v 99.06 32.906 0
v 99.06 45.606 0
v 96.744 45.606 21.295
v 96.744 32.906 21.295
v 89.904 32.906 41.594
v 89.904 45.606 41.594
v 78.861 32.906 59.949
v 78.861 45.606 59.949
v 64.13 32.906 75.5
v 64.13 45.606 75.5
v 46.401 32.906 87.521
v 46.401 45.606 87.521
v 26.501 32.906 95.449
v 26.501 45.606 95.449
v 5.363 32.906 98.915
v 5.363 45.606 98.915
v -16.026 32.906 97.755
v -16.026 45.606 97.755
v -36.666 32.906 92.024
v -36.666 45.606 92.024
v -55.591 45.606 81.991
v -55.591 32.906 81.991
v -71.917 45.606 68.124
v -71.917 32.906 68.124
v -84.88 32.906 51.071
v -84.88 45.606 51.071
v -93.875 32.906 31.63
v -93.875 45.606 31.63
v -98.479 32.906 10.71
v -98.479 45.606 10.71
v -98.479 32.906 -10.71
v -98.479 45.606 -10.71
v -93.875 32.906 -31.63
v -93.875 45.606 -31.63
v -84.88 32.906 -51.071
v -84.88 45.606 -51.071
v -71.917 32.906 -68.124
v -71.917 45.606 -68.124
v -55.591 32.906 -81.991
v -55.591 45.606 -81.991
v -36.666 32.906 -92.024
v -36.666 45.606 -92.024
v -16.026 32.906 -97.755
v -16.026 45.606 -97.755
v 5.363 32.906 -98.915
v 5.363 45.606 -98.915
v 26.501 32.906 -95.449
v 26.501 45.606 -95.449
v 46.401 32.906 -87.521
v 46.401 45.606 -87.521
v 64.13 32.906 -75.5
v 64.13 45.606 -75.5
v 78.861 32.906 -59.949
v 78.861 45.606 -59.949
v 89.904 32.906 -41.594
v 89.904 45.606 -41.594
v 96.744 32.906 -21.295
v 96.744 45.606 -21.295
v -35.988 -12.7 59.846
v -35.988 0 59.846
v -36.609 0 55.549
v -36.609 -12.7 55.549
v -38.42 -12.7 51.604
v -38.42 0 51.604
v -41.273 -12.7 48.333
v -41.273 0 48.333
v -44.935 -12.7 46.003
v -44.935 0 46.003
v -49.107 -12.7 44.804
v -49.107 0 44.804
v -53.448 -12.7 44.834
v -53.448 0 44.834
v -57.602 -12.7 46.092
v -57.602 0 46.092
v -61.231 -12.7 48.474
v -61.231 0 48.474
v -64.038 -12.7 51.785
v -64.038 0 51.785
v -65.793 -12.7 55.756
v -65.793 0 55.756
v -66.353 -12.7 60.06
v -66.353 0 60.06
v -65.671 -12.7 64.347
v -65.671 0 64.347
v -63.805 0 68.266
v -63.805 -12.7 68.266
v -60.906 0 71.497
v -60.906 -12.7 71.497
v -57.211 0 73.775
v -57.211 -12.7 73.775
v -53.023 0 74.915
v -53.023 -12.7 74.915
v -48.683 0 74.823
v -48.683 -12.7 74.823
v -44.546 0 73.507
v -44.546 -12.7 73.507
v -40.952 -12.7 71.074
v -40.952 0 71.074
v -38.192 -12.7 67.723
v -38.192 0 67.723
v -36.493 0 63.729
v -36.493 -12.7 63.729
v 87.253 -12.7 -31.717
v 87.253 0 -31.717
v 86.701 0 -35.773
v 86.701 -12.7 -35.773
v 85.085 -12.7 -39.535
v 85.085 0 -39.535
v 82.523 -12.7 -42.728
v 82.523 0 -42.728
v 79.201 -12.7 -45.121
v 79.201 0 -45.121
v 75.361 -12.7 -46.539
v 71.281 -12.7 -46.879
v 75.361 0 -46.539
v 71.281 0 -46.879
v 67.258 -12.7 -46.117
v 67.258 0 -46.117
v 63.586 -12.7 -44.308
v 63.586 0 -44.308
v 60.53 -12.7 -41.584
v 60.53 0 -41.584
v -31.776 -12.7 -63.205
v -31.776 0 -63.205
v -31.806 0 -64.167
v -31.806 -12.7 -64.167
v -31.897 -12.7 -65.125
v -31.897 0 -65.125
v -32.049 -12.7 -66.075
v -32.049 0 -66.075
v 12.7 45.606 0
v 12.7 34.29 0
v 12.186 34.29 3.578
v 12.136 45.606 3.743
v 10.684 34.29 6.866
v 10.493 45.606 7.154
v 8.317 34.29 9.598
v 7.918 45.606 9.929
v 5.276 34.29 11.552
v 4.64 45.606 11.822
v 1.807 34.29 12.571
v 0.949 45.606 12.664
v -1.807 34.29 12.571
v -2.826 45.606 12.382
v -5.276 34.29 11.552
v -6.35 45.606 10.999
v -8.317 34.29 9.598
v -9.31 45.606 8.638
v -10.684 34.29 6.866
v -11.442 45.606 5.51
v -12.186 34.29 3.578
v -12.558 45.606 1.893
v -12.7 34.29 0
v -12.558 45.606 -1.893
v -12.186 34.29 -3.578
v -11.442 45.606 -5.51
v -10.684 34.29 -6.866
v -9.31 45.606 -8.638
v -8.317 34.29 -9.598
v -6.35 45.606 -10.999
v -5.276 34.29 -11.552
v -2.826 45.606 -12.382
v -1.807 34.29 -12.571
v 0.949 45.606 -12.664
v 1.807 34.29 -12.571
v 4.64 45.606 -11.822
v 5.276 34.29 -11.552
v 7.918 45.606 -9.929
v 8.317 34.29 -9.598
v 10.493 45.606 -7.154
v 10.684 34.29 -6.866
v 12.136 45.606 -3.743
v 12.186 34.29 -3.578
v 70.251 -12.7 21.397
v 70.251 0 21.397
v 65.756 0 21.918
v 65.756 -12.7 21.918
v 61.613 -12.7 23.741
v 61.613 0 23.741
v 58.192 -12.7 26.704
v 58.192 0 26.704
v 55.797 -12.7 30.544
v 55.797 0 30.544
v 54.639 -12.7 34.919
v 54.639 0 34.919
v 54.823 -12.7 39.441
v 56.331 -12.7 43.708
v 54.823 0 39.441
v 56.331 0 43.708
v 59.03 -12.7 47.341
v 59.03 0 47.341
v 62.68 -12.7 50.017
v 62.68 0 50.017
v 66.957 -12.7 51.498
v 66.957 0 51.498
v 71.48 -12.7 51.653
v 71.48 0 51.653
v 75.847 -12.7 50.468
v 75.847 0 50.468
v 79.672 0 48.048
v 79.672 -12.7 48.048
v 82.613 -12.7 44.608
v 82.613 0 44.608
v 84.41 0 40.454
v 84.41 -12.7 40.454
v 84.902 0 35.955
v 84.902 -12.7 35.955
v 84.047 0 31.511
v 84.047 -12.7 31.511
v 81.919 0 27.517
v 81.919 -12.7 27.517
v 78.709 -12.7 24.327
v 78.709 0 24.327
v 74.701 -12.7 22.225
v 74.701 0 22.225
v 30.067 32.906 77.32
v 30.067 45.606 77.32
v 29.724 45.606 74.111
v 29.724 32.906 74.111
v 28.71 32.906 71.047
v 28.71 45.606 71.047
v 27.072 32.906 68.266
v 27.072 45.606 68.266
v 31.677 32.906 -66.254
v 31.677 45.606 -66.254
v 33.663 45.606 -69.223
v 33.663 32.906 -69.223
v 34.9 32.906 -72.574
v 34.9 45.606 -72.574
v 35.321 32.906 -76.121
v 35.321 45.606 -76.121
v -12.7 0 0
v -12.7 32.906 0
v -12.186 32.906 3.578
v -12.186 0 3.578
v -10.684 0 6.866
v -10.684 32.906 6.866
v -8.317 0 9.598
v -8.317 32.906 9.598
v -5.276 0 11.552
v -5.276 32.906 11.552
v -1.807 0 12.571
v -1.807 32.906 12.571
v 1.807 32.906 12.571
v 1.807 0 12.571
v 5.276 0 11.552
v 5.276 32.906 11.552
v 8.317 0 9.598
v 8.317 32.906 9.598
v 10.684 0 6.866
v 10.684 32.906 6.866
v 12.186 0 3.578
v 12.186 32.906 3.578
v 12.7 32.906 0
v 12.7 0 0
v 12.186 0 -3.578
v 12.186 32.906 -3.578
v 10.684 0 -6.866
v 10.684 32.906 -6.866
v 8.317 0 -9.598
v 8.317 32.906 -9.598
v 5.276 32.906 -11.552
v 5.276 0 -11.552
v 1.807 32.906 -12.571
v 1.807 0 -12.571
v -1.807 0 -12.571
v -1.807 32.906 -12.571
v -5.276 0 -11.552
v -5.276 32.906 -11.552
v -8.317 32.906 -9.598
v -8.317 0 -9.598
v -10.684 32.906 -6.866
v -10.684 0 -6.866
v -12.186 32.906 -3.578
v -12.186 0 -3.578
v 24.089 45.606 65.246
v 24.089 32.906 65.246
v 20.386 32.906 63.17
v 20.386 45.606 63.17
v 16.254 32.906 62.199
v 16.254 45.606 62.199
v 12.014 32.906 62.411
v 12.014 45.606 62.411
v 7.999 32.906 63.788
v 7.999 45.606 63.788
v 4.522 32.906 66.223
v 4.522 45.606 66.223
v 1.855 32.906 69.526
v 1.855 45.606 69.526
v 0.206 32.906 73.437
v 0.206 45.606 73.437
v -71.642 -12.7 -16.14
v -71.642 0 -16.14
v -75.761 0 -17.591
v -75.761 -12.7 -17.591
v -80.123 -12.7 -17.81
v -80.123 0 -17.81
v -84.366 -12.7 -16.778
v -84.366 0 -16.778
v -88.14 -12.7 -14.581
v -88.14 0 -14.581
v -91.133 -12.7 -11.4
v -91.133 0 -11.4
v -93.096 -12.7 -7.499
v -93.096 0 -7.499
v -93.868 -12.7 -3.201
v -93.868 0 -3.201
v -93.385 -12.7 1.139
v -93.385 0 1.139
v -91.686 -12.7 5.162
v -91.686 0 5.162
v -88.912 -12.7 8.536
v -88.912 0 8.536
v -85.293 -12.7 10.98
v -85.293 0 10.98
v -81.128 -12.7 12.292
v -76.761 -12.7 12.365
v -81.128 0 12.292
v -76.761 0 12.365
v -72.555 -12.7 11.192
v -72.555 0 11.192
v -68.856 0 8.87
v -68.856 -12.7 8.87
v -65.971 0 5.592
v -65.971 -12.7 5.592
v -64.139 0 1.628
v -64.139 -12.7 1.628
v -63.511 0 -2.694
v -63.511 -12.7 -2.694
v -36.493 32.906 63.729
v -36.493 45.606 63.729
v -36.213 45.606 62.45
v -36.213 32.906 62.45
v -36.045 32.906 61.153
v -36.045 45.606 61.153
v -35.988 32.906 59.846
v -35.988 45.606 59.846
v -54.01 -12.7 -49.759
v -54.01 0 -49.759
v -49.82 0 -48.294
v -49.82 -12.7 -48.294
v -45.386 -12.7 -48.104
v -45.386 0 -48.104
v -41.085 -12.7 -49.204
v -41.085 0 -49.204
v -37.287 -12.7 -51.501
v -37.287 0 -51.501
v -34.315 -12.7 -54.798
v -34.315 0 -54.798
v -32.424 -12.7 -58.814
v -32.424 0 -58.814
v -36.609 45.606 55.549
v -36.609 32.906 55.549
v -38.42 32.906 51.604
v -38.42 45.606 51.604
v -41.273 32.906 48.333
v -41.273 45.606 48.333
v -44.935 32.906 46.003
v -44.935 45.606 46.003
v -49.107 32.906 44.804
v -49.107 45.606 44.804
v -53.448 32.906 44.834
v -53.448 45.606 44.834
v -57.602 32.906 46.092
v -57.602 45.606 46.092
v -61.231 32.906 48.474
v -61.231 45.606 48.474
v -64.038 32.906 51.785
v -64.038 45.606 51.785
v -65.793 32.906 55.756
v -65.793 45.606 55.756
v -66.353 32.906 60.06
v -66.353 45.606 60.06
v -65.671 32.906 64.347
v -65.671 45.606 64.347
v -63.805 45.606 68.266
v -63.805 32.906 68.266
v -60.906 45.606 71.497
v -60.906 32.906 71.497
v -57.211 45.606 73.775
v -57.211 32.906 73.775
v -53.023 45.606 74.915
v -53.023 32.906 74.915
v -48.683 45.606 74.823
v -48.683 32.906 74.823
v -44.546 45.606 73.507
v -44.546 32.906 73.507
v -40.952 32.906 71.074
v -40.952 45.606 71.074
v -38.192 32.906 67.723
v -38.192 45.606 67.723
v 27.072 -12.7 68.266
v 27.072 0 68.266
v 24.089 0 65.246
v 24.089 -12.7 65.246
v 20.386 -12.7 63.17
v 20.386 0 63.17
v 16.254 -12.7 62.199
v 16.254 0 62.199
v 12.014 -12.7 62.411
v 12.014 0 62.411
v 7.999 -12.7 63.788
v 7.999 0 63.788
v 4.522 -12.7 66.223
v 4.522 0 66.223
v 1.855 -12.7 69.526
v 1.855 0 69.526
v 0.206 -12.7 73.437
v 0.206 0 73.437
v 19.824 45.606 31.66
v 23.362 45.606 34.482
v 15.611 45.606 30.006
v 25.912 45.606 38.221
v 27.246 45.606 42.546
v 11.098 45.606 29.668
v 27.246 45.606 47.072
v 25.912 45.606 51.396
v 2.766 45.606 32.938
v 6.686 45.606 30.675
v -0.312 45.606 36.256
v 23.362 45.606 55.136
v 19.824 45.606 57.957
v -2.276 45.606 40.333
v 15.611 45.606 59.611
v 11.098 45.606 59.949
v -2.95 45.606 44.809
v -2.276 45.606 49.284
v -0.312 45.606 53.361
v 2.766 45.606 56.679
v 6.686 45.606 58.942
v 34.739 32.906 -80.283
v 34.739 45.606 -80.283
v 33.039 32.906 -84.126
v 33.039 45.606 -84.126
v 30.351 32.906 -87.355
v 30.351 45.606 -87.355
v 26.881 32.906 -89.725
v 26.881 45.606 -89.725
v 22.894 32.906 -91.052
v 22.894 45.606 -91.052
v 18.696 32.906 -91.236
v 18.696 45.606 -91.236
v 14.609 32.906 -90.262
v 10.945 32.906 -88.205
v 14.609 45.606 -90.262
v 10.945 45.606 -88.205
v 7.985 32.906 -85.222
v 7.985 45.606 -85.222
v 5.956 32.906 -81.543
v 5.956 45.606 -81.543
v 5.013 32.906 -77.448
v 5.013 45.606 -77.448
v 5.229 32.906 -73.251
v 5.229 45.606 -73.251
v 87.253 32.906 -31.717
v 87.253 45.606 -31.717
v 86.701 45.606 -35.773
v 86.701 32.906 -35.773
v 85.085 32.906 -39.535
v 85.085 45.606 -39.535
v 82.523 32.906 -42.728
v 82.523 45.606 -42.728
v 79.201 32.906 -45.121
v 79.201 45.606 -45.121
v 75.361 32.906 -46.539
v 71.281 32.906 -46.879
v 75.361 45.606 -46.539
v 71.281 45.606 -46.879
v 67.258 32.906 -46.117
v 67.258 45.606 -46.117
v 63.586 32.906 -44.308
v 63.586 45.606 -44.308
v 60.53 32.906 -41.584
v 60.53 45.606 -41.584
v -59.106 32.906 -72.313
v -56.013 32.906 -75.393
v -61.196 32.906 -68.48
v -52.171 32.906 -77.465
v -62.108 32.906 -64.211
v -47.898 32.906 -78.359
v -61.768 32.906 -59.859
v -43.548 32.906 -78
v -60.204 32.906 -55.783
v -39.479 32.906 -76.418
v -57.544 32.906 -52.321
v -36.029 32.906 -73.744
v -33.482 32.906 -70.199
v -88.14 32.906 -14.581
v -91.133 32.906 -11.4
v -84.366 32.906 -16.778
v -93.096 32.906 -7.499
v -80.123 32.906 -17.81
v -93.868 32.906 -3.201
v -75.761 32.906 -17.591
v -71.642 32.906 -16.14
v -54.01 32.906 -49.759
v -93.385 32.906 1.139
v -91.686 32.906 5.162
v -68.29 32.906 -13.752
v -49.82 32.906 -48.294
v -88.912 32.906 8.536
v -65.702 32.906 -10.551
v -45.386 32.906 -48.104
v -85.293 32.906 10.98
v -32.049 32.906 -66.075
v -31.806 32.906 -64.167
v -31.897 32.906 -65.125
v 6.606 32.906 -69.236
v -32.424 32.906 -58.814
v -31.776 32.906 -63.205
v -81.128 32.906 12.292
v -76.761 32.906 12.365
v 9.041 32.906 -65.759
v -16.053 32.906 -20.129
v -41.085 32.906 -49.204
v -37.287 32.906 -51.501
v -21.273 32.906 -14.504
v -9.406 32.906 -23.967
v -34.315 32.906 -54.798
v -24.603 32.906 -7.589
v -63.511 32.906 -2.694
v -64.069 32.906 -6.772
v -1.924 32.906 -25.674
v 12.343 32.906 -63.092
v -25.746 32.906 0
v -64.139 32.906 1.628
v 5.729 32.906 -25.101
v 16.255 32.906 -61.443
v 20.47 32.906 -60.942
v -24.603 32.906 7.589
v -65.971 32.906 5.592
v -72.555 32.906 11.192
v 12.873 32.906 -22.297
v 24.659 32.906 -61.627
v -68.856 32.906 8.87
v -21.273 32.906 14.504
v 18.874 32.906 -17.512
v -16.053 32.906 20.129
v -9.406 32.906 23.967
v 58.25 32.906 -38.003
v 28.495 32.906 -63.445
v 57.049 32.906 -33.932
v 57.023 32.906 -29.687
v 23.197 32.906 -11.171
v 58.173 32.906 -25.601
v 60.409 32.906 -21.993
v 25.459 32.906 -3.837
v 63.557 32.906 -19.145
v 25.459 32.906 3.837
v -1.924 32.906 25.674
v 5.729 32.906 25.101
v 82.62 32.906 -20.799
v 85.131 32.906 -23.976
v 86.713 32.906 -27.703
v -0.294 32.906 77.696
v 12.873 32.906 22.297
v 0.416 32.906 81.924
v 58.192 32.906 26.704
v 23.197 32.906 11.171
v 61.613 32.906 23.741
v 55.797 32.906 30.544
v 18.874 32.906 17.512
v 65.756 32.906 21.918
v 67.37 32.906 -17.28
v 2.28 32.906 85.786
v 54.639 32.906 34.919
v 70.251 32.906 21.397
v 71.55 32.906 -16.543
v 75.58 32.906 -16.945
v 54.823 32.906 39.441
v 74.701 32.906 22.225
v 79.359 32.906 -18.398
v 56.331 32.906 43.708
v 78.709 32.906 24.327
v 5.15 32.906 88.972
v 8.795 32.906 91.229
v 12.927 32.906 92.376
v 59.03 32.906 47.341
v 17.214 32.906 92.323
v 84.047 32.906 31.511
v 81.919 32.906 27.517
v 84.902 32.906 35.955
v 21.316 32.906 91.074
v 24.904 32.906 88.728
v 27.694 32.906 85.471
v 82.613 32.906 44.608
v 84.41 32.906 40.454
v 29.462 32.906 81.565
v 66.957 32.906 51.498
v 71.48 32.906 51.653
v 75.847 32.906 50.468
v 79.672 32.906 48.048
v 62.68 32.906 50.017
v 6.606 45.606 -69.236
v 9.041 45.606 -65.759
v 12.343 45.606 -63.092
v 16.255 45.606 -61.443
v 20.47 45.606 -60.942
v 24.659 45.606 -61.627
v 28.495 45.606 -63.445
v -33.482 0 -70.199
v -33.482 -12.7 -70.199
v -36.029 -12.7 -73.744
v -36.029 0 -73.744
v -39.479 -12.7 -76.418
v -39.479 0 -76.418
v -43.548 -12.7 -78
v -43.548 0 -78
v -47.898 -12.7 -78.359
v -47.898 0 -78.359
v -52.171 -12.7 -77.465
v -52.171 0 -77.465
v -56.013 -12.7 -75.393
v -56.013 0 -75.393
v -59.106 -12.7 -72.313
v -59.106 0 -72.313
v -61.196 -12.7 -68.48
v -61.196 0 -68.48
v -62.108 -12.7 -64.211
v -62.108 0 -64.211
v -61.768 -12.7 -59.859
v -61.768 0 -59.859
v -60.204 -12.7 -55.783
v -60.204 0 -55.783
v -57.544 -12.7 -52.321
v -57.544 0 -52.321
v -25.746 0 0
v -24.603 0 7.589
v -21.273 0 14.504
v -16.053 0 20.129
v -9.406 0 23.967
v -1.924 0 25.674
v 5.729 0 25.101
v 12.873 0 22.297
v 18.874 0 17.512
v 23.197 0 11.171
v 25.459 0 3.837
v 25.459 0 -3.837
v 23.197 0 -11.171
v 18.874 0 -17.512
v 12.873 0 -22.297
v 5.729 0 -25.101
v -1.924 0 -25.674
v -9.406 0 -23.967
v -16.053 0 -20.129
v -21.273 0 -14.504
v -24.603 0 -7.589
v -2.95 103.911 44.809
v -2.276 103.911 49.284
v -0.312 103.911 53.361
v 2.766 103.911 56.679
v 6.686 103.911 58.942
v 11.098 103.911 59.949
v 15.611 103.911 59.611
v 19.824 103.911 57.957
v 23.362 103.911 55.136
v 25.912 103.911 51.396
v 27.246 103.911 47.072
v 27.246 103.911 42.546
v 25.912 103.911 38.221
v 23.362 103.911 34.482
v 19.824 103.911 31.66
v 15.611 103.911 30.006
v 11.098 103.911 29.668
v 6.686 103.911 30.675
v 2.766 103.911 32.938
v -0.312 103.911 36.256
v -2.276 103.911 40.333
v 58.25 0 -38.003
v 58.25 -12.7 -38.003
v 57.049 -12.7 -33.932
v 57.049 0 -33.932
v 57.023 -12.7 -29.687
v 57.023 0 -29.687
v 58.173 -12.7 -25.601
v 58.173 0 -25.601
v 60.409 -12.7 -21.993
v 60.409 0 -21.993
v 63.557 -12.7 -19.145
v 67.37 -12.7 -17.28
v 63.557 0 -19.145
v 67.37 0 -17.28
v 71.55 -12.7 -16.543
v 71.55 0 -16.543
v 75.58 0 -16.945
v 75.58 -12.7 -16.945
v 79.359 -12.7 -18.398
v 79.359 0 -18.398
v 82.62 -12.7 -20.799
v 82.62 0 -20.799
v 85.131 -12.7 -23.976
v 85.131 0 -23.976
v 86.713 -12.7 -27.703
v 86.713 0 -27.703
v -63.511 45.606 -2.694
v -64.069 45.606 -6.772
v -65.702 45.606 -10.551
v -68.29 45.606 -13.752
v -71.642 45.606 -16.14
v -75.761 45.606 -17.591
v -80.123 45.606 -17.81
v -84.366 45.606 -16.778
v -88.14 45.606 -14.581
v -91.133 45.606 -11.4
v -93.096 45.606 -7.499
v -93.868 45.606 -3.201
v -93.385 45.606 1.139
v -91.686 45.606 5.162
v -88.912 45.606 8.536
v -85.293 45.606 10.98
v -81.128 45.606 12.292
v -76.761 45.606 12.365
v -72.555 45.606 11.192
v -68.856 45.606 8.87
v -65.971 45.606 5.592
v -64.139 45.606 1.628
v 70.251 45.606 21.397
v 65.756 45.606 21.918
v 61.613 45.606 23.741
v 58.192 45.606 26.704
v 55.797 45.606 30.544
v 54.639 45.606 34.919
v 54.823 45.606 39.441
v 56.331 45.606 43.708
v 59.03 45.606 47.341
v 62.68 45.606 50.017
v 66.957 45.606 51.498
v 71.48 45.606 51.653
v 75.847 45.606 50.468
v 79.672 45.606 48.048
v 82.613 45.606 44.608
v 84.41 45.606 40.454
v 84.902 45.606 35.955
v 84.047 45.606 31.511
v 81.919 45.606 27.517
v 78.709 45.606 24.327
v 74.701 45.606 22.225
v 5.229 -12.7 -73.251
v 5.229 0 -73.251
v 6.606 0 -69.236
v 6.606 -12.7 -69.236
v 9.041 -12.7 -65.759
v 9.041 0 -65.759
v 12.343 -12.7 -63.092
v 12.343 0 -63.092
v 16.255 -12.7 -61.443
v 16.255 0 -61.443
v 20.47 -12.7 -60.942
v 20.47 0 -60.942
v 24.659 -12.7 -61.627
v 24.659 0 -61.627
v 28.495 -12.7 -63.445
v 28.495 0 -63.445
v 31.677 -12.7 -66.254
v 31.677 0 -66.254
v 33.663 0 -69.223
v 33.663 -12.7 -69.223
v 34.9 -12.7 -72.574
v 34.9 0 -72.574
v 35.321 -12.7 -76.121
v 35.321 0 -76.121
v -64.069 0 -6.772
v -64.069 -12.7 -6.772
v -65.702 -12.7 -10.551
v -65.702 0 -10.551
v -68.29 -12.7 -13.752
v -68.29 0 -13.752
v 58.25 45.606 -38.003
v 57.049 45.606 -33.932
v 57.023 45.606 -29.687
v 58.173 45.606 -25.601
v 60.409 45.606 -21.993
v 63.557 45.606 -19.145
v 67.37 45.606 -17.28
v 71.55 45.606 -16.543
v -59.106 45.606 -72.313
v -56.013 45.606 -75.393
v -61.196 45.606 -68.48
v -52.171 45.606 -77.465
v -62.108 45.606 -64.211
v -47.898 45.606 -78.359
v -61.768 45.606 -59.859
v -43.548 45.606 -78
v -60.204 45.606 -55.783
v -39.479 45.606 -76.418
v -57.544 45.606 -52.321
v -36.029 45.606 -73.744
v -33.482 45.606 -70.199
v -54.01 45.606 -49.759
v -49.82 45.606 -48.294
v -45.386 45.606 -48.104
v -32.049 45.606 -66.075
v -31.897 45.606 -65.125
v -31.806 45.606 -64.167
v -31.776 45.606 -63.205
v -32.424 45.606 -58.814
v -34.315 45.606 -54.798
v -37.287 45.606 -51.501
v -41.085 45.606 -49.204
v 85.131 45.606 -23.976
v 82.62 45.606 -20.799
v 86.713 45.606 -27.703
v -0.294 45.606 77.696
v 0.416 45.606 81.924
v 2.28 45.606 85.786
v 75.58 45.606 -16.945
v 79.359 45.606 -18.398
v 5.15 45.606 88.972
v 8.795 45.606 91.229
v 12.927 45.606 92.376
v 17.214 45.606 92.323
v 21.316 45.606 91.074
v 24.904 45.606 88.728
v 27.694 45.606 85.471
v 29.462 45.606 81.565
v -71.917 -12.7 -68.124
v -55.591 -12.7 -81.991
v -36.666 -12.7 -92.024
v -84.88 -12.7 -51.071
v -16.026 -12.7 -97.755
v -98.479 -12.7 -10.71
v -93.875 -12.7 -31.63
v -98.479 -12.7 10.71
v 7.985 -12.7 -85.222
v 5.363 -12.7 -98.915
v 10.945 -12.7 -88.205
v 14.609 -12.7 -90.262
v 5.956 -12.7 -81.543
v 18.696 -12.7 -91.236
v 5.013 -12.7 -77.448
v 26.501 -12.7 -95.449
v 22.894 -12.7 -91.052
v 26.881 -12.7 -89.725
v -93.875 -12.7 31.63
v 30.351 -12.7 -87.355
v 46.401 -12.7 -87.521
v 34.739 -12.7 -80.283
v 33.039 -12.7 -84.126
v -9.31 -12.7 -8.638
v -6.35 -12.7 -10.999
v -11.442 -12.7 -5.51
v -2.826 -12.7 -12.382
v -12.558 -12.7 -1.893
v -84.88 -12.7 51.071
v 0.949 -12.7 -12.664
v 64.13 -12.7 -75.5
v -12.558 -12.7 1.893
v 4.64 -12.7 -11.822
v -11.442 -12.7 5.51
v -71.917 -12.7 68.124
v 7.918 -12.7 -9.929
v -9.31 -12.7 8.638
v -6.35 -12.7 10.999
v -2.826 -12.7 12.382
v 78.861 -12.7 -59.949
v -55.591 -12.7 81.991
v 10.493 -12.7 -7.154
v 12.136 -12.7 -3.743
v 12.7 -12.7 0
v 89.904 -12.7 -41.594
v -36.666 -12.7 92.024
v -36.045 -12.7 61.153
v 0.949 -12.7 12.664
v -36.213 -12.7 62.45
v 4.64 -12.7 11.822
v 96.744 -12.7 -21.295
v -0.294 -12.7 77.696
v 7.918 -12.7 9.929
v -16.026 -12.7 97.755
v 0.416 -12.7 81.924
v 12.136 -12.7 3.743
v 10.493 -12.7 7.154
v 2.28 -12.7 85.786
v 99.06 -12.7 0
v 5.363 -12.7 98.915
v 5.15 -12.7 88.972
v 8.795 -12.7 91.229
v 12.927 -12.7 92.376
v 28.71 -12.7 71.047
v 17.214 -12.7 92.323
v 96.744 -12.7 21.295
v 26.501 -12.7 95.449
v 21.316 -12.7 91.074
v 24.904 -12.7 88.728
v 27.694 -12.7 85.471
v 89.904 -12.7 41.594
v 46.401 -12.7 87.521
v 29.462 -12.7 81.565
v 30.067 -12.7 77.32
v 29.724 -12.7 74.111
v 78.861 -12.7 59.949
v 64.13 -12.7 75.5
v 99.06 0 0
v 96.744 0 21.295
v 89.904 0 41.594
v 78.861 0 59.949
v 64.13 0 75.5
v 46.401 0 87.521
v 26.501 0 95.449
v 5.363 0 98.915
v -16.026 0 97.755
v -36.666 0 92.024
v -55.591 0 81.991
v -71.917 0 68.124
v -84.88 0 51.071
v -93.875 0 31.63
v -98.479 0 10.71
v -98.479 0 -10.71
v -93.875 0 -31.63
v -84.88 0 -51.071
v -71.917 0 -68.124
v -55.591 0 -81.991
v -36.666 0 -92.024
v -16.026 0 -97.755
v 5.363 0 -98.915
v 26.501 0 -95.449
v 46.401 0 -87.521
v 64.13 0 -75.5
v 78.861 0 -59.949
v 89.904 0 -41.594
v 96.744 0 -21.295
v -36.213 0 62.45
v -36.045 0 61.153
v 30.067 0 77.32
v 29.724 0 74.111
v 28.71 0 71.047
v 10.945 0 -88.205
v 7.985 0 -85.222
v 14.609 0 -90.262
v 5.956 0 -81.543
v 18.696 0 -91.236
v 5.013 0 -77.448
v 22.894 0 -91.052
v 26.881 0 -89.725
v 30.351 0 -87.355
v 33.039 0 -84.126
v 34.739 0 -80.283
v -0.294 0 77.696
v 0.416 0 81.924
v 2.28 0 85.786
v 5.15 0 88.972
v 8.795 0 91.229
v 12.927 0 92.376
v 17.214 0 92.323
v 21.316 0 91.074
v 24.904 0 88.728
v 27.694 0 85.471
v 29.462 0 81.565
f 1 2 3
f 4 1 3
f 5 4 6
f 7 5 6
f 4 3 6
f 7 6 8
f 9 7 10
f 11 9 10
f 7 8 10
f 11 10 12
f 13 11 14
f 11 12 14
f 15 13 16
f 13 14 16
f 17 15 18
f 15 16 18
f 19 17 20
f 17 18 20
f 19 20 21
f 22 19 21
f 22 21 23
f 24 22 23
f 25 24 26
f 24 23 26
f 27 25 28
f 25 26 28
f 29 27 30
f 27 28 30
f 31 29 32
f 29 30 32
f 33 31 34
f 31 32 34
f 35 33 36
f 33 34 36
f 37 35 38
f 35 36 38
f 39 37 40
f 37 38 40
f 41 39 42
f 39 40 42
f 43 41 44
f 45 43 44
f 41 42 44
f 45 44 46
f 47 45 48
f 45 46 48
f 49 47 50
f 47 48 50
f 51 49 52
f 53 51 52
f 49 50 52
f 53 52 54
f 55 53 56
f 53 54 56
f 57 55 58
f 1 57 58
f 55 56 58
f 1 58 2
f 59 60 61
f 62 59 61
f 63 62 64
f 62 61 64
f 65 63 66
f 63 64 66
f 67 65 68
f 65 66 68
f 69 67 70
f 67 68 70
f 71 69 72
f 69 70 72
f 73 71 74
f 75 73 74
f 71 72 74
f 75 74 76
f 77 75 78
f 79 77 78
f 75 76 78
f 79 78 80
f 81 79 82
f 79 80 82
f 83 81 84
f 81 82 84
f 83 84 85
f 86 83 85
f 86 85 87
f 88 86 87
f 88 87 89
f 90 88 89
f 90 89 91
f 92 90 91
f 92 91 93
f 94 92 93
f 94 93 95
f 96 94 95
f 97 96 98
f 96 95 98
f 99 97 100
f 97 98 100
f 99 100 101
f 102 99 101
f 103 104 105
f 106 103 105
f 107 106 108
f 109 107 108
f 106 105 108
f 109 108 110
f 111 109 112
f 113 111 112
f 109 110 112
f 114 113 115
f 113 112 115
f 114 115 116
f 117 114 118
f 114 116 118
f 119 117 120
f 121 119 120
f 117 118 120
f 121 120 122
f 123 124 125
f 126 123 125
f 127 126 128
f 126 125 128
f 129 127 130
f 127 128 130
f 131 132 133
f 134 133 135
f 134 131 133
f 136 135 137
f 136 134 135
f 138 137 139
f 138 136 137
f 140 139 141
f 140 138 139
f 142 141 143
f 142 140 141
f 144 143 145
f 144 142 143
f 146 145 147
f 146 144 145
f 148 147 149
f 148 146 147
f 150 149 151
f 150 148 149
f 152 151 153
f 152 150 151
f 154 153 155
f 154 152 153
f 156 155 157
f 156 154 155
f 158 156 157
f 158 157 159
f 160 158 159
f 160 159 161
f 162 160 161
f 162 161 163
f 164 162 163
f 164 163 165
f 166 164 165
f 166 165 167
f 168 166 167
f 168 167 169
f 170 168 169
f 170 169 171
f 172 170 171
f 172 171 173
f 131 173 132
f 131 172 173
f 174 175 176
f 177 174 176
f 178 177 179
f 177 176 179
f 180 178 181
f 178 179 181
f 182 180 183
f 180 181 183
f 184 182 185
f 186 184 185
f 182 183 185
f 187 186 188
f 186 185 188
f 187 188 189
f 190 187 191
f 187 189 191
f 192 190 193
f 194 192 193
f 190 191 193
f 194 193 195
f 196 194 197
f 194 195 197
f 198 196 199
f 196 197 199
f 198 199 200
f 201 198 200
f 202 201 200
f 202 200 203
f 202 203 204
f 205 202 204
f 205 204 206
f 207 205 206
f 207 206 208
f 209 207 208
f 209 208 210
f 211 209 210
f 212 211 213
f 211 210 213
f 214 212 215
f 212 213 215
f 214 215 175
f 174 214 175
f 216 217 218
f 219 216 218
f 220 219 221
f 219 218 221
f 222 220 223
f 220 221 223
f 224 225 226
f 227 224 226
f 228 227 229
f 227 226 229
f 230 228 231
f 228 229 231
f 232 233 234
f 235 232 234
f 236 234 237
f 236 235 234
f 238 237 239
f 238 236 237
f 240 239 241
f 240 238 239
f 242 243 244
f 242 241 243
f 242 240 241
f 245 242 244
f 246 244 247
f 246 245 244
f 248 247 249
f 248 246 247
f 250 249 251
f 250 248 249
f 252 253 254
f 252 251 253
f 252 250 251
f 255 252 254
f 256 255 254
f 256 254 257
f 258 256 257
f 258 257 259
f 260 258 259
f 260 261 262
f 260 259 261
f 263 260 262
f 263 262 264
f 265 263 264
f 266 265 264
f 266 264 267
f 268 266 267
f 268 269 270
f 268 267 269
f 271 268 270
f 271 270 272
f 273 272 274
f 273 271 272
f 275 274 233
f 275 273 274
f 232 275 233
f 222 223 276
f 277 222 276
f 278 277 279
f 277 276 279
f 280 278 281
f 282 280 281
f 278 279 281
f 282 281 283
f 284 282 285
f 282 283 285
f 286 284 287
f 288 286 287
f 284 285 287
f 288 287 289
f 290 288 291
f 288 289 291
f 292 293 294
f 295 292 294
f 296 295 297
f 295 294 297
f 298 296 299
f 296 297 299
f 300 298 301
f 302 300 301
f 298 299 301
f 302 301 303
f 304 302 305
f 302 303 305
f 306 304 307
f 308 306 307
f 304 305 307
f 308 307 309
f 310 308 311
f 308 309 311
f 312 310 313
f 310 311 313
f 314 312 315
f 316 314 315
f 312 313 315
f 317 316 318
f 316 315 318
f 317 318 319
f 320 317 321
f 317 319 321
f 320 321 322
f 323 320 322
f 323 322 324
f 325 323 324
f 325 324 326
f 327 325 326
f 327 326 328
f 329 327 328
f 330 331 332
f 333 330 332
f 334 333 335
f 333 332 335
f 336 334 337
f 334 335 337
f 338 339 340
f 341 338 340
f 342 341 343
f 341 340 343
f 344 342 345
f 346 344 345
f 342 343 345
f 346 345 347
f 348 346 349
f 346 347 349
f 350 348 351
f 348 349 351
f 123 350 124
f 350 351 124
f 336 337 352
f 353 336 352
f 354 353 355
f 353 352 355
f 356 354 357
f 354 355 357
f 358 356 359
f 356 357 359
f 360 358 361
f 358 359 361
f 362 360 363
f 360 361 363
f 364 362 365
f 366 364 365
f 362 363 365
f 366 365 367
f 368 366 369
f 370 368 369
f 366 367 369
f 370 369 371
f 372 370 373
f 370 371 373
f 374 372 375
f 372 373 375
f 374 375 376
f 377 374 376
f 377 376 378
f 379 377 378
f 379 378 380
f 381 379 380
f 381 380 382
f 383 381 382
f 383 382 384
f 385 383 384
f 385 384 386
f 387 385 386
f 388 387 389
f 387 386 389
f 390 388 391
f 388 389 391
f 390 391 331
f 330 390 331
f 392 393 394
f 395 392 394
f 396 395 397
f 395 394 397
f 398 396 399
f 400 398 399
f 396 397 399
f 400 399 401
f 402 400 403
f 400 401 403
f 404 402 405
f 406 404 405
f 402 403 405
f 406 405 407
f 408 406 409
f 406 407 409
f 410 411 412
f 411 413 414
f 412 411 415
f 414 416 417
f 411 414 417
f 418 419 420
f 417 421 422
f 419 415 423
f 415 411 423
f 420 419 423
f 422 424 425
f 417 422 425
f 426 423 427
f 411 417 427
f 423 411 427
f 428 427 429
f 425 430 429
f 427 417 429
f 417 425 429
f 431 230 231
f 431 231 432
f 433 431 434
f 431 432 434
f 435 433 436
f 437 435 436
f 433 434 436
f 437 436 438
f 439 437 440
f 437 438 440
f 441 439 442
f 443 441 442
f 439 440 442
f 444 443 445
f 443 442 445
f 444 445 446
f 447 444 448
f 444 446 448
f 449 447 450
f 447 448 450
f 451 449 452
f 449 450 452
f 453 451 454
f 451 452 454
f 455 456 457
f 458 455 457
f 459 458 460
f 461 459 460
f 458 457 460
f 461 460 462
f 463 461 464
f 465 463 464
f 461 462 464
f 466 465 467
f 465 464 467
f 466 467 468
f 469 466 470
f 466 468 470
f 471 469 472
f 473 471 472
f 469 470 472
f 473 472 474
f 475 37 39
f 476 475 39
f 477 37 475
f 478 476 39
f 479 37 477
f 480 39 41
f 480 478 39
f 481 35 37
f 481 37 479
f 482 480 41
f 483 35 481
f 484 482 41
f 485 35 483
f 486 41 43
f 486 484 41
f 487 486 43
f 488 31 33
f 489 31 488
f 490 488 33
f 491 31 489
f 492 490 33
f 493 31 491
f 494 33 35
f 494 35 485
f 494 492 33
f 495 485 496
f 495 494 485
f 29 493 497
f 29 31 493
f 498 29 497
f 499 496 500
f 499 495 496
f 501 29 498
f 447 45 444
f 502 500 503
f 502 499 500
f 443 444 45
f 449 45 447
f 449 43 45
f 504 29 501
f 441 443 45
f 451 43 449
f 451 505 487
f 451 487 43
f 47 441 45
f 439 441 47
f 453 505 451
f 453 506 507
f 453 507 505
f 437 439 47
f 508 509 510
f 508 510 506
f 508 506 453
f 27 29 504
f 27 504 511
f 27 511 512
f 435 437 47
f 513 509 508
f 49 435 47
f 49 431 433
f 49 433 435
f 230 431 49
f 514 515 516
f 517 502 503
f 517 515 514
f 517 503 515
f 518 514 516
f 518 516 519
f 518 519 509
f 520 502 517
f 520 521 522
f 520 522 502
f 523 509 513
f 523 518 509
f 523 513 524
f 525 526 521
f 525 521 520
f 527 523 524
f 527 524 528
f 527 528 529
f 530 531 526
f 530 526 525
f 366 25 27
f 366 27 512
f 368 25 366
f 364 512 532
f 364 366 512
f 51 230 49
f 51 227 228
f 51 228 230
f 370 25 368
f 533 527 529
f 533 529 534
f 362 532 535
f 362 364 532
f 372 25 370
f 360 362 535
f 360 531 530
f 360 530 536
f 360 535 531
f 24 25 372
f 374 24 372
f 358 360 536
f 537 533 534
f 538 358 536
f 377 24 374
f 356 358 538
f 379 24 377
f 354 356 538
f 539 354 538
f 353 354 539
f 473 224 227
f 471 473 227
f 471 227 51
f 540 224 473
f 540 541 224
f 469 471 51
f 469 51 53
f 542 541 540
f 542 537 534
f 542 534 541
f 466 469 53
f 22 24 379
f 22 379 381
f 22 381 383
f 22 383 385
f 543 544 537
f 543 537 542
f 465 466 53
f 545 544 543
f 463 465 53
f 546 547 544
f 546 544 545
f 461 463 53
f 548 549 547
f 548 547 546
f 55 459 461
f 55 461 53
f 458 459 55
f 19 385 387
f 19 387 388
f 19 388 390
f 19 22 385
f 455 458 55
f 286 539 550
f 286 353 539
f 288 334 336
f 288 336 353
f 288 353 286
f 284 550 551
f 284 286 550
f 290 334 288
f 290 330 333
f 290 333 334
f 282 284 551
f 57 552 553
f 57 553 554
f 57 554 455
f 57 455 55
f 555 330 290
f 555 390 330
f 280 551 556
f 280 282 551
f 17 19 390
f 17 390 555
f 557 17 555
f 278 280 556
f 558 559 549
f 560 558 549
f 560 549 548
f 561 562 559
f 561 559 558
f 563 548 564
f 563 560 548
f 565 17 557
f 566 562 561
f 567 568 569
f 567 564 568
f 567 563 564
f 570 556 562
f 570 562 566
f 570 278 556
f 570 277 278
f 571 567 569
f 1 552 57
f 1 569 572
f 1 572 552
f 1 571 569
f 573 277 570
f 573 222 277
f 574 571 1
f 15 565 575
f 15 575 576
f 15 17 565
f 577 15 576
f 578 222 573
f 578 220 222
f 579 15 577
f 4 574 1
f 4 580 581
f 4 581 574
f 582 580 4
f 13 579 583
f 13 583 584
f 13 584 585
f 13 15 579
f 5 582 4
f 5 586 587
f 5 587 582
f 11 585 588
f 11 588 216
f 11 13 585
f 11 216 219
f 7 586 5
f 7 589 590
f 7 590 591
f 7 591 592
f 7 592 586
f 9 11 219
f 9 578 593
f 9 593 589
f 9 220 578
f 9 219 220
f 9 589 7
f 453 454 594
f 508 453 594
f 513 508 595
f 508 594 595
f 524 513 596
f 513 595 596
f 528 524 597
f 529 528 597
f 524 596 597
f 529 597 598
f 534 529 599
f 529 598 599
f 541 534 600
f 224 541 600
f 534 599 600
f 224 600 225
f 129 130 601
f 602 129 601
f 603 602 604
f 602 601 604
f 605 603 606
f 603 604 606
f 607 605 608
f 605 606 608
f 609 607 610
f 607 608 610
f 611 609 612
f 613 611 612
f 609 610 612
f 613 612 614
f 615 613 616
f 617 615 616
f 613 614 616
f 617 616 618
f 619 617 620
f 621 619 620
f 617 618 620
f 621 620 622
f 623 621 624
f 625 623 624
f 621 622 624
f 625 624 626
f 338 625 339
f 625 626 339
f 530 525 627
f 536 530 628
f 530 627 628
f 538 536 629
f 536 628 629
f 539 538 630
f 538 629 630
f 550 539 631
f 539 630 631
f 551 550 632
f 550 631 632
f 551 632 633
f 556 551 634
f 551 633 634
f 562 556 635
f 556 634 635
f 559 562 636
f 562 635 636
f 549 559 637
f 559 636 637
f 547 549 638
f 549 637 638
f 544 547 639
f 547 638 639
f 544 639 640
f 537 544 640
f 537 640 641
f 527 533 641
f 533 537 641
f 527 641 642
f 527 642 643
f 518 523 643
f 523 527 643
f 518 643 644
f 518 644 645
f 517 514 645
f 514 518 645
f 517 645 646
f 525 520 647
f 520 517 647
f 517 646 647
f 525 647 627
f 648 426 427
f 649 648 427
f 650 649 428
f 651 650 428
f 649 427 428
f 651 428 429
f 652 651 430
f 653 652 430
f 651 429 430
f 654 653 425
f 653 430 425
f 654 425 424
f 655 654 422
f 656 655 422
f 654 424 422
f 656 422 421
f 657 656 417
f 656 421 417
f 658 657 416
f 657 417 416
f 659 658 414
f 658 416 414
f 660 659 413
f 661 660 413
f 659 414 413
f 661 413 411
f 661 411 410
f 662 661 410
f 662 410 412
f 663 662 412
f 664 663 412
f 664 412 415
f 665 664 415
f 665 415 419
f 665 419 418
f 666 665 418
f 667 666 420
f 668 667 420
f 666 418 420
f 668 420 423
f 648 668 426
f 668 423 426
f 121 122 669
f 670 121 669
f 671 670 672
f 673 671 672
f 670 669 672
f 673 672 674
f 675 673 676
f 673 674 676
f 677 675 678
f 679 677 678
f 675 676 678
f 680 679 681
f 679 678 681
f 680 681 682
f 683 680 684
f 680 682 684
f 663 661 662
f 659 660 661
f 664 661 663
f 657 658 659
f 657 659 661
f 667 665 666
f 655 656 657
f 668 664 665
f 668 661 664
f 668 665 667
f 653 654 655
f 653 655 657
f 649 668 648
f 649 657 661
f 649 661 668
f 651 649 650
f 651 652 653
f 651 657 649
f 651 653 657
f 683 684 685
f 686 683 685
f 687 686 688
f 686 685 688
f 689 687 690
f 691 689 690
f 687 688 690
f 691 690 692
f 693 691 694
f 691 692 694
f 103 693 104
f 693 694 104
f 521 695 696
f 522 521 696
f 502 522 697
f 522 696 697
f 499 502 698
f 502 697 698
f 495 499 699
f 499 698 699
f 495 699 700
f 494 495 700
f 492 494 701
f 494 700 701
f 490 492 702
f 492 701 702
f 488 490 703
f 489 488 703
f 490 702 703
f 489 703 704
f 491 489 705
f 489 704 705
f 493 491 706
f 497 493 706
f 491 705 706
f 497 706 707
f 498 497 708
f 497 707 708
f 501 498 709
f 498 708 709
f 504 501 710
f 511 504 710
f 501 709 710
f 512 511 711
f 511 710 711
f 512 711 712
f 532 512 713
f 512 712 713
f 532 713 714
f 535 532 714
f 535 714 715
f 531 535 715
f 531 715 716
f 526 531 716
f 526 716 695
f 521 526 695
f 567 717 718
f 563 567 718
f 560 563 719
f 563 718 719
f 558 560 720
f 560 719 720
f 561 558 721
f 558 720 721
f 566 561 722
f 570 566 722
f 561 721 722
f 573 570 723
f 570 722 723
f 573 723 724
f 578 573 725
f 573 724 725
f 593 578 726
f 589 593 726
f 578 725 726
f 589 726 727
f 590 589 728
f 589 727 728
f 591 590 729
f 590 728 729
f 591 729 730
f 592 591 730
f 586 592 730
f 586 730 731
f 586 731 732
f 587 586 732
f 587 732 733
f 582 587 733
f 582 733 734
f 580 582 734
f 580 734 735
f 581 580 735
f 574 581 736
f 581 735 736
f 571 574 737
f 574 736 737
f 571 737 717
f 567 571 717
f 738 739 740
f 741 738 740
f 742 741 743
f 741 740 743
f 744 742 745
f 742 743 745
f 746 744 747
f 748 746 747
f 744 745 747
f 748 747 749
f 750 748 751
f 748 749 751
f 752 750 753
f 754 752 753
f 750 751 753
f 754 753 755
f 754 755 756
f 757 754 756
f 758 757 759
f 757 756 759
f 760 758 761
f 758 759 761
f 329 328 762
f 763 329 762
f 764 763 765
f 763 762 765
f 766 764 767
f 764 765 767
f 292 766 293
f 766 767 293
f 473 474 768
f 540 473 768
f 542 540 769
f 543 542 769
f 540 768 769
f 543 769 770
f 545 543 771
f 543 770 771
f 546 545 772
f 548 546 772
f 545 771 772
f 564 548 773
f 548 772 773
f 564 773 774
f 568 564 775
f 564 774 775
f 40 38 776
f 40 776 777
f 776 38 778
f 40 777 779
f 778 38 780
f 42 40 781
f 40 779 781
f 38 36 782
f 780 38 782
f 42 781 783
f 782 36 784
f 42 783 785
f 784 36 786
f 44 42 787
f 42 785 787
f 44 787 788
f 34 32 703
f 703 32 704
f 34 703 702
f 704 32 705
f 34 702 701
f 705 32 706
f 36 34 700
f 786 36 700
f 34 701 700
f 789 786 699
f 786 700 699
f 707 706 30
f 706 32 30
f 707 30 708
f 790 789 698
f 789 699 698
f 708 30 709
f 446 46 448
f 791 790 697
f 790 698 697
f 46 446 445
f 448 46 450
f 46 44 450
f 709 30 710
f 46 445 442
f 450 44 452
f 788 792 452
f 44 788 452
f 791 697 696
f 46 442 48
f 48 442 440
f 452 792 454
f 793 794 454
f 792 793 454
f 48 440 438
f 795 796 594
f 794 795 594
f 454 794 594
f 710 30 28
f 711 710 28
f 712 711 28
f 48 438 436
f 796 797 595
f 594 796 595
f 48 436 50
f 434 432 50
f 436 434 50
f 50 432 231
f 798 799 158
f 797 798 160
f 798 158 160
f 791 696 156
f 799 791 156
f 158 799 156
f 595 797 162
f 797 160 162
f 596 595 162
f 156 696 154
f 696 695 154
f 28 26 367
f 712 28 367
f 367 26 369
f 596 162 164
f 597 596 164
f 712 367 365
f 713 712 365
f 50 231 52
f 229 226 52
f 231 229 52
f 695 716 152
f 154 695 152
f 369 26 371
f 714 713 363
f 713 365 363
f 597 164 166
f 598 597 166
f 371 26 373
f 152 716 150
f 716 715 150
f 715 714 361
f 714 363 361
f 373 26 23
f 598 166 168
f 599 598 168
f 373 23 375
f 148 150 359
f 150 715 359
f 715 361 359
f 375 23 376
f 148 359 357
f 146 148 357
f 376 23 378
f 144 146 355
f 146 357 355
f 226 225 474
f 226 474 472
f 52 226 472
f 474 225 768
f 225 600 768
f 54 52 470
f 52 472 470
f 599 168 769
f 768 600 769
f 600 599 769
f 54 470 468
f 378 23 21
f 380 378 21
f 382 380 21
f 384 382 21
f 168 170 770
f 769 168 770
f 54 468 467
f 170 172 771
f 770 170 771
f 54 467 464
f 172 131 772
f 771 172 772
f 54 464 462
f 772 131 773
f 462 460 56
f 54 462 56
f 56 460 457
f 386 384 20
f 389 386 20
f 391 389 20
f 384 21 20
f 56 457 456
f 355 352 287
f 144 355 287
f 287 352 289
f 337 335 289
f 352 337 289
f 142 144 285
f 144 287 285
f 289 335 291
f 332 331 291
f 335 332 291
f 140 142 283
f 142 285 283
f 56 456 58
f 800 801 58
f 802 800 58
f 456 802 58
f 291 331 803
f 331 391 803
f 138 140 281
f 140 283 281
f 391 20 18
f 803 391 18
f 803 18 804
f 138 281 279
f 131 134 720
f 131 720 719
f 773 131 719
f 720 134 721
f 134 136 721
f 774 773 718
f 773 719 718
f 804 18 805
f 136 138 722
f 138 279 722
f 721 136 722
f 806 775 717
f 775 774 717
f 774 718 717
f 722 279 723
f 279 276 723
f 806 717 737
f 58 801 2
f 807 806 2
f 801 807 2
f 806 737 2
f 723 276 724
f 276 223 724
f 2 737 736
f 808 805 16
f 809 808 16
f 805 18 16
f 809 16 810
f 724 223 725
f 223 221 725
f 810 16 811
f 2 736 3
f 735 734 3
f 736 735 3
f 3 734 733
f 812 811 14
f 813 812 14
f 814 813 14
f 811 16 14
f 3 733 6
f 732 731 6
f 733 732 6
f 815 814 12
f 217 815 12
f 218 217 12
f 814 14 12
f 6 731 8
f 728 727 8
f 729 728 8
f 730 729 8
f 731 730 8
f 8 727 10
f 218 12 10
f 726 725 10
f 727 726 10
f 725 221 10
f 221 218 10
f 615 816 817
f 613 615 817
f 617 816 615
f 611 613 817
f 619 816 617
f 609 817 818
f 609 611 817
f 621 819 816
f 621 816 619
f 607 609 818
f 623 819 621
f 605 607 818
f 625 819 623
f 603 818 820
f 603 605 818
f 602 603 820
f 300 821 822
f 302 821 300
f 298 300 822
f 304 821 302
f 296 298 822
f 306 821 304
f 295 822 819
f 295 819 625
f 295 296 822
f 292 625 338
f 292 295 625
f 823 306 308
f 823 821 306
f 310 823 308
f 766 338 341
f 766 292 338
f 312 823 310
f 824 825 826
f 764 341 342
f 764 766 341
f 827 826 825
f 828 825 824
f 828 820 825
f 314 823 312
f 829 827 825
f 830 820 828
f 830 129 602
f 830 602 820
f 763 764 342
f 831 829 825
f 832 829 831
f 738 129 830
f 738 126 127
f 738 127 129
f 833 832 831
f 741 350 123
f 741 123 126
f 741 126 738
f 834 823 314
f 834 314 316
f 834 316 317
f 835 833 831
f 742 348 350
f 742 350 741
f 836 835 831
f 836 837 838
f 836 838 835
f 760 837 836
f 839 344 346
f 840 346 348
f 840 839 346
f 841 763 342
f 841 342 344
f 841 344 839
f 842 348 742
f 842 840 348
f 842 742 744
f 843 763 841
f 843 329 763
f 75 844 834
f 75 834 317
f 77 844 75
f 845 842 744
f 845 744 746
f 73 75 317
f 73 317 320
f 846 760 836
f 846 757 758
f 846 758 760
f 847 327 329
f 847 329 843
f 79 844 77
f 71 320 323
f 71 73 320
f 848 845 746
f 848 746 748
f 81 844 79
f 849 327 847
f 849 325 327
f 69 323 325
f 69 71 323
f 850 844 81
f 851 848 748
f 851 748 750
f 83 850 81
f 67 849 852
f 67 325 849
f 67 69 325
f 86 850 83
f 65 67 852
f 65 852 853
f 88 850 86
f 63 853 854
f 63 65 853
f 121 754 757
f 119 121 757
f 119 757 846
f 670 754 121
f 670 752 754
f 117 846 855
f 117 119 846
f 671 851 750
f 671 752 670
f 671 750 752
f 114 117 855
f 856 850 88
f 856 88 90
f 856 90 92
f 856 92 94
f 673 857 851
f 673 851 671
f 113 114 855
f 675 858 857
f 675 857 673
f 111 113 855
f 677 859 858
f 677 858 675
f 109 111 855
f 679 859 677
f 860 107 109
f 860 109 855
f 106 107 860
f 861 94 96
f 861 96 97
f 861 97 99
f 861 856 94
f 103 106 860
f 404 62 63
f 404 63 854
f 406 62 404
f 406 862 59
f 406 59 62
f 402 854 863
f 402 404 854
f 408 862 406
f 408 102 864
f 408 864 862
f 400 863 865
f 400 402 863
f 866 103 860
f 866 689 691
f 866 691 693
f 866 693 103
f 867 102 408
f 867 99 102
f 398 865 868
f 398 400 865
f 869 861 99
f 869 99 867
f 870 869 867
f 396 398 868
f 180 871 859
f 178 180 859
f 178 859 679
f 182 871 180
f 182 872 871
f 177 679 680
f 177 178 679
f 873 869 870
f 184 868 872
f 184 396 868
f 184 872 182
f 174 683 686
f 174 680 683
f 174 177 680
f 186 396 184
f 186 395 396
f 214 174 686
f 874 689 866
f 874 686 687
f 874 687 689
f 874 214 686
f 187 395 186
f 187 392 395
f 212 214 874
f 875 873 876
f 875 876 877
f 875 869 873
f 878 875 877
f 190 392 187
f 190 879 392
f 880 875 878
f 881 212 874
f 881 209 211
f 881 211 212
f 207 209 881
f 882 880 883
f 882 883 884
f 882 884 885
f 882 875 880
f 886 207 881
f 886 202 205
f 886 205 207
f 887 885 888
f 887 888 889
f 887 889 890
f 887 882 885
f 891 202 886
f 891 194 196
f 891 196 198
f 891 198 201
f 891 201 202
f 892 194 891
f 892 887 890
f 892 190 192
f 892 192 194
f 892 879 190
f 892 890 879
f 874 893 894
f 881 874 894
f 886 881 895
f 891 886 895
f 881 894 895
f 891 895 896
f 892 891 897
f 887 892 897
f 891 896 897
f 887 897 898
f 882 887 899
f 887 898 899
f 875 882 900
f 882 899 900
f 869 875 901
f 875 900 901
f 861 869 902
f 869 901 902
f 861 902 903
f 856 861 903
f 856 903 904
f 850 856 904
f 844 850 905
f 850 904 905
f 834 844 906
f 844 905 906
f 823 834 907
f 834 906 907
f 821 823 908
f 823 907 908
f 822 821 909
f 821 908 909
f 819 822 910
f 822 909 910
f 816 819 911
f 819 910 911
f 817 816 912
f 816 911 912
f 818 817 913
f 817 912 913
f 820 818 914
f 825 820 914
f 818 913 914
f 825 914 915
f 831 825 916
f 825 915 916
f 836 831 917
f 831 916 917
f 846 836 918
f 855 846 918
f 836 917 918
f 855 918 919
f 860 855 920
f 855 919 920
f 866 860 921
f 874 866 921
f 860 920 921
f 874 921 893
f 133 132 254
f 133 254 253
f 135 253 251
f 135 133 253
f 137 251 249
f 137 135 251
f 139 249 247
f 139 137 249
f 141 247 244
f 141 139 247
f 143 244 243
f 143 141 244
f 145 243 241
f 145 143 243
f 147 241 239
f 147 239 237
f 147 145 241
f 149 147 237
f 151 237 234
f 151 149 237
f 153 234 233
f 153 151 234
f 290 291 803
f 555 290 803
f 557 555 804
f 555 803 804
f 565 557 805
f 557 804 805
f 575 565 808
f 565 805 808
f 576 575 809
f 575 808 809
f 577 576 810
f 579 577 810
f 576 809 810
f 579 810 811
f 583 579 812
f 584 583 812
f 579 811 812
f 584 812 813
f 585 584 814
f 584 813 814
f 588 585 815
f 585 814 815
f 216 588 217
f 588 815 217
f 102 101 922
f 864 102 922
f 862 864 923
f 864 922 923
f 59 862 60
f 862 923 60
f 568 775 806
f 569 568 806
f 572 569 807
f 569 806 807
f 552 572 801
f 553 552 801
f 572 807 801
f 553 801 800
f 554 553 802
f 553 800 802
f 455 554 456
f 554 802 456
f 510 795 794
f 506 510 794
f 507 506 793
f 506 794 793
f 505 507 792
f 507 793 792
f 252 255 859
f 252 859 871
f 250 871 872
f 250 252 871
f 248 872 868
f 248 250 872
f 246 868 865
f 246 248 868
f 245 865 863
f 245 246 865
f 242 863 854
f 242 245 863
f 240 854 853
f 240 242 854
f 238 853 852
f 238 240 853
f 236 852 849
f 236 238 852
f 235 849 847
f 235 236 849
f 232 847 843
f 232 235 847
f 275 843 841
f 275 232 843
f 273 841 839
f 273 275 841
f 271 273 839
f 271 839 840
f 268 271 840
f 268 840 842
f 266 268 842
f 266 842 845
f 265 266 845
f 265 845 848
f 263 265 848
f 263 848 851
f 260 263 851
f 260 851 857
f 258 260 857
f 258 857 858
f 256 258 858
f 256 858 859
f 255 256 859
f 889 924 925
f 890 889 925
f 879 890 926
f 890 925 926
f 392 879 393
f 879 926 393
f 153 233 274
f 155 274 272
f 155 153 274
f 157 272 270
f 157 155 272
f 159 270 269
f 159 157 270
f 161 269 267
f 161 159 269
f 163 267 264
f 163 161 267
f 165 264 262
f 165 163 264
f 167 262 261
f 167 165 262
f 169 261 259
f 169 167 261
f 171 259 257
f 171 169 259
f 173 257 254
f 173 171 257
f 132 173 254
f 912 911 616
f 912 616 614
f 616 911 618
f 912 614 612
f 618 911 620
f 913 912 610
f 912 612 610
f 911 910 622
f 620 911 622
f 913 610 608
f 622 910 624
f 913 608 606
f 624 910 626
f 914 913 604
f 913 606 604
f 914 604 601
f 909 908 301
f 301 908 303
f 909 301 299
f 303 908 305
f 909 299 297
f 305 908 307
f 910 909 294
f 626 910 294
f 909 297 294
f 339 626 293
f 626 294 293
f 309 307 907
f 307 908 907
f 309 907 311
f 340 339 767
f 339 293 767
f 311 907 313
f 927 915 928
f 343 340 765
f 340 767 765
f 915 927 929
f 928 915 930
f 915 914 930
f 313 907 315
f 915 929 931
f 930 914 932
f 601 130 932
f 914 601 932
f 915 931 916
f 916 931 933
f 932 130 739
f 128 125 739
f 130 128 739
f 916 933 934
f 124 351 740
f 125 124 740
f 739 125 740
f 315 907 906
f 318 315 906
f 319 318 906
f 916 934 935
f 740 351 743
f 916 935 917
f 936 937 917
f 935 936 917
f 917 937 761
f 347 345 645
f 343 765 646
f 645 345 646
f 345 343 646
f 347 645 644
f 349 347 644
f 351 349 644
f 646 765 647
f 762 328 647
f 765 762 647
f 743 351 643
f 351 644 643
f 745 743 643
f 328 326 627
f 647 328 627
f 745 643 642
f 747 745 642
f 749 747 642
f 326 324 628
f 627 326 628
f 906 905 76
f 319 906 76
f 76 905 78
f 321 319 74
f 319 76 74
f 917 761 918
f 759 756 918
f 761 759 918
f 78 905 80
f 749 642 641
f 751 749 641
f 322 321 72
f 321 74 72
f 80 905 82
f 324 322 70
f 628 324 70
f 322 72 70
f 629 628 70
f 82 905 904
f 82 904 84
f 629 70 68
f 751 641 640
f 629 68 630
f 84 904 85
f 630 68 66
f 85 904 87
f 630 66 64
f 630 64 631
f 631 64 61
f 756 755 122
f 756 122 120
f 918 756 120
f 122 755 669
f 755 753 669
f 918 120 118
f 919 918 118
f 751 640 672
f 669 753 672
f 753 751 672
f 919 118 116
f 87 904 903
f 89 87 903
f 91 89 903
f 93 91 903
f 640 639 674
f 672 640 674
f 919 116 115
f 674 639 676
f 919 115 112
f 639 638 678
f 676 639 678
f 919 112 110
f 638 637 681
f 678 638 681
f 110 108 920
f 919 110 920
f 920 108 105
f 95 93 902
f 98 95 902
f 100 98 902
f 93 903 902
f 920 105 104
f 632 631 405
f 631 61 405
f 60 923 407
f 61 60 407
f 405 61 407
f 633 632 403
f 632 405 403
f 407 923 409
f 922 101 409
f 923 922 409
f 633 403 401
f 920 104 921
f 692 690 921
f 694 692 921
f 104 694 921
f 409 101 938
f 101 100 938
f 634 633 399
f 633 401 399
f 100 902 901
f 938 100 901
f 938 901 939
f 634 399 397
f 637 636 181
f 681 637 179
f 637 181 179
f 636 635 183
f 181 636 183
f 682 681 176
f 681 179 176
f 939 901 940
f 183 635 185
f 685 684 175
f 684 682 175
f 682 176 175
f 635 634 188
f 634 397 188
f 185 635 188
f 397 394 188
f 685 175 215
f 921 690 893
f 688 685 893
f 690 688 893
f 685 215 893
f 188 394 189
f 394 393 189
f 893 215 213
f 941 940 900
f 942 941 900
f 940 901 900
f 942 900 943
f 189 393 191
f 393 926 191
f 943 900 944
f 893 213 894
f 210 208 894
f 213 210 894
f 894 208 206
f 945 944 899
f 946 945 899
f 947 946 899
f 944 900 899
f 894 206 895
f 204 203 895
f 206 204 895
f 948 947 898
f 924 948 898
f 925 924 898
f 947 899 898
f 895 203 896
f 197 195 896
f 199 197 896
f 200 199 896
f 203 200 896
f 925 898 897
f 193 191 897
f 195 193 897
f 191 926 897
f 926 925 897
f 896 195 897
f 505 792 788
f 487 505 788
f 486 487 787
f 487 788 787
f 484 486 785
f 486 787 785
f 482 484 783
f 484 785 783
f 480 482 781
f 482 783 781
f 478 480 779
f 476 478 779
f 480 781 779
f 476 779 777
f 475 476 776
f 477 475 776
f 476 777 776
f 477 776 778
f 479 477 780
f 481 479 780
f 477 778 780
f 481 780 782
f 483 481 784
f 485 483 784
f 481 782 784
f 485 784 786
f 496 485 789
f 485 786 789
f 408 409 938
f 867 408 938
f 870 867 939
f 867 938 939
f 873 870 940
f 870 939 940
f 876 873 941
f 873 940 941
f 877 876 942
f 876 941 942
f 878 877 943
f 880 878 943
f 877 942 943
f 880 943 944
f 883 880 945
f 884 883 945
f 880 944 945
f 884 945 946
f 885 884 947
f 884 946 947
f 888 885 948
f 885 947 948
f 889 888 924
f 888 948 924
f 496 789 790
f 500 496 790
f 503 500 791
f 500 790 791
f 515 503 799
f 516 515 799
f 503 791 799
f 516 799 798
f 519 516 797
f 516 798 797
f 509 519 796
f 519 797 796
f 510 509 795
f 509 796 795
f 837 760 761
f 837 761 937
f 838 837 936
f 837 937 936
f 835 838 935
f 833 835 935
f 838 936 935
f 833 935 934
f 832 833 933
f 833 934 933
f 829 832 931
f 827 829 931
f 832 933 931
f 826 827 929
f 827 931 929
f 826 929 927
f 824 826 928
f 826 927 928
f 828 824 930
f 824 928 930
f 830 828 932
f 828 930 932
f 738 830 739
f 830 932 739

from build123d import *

# Parameters (mm, degrees)
F0_R     = 99.06
F0_R_2   = 12.7
F1_DEPTH = 12.7
F4_R     = 25.7464776051
F4_R_2   = 12.7
F5_DEPTH = 34.29
F6_R     = 15.18285
F7_DEPTH = 58.3057


with BuildPart() as f1:
    # F0 (on Front) → F1 (new body)
    with BuildSketch(Plane.XZ):
        Circle(F0_R)
        with BuildLine():
            ThreePointArc((87.2525606561, -31.7166266483), (77.3287632035, -45.9595652645), (60.5301336512, -41.5835966325))
            Line((60.5301336512, -41.5835966325), (31.6772493906, -66.2543920036))
            ThreePointArc((31.6772493906, -66.2543920036), (34.3806110019, -70.8623094404), (35.3205223857, -76.1213619879))
            ThreePointArc((35.3205223857, -76.1213619879), (18.6961355427, -91.235623652), (5.2285560351, -73.2513125515))
            Line((5.2285560351, -73.2513125515), (-32.0493275742, -66.0752085942))
            ThreePointArc((-32.0493275742, -66.0752085942), (-56.0130922655, -75.3925410567), (-54.0102309185, -49.7592960647))
            Line((-54.0102309185, -49.7592960647), (-71.6421071885, -16.1400454247))
            ThreePointArc((-71.6421071885, -16.1400454247), (-93.8678539395, -3.2136815215), (-72.5782123825, 11.2024852635))
            Line((-72.5782123825, 11.2024852635), (-57.2869188572, 45.9489011465))
            ThreePointArc((-57.2869188572, 45.9489011465), (-61.0382070418, 71.3851457465), (-36.4933195968, 63.7285666992))
            Line((-36.4933195968, 63.7285666992), (0.2064878138, 73.4373879676))
            ThreePointArc((0.2064878138, 73.4373879676), (12.9265601576, 92.3764736183), (30.0672552745, 77.3203859252))
            ThreePointArc((30.0672552745, 77.3203859252), (29.2989487183, 72.551751799), (27.0717871734, 68.2657375846))
            Line((27.0717871734, 68.2657375846), (57.5444049494, 45.6260237994))
            ThreePointArc((57.5444049494, 45.6260237994), (74.5004209745, 50.9859189025), (84.9146368483, 36.5713754587))
            ThreePointArc((84.9146368483, 36.5713754587), (80.649808931, 26.0207485615), (70.2512860382, 21.3974157015))
            Line((70.2512860382, 21.3974157015), (71.5502114662, -16.5426668911))
            ThreePointArc((71.5502114662, -16.5426668911), (82.6203375533, -20.7986045656), (87.2525606561, -31.7166266483))
        make_face(mode=Mode.SUBTRACT)
        with BuildLine():
            Line((31.6772493906, -66.2543920036), (60.5301336512, -41.5835966325))
            ThreePointArc((60.5301336512, -41.5835966325), (58.173043061, -25.6009448486), (71.5502114662, -16.5426668911))
            Line((71.5502114662, -16.5426668911), (70.2512860382, 21.3974157015))
            ThreePointArc((70.2512860382, 21.3974157015), (56.2859237552, 29.519588465), (57.5444049494, 45.6260237994))
            Line((57.5444049494, 45.6260237994), (27.0717871734, 68.2657375846))
            ThreePointArc((27.0717871734, 68.2657375846), (12.0143558381, 62.4112695746), (0.2064878138, 73.4373879676))
            Line((0.2064878138, 73.4373879676), (-36.4933195968, 63.7285666992))
            ThreePointArc((-36.4933195968, 63.7285666992), (-36.1151493645, 61.8034138585), (-35.9883870575, 59.8455687416))
            ThreePointArc((-35.9883870575, 59.8455687416), (-42.8746879342, 47.1299796177), (-57.2869188572, 45.9489011465))
            Line((-57.2869188572, 45.9489011465), (-72.5782123825, 11.2024852635))
            ThreePointArc((-72.5782123825, 11.2024852635), (-65.9783050583, 5.6023667917), (-63.5110441822, -2.6941823316))
            ThreePointArc((-63.5110441822, -2.6941823316), (-65.701874357, -10.5507945139), (-71.6421071885, -16.1400454247))
            Line((-71.6421071885, -16.1400454247), (-54.0102309185, -49.7592960647))
            ThreePointArc((-54.0102309185, -49.7592960647), (-39.1018317425, -50.2131393325), (-31.7755939248, -63.2051591578))
            ThreePointArc((-31.7755939248, -63.2051591578), (-31.8441822607, -64.6466960007), (-32.0493275742, -66.0752085942))
            Line((-32.0493275742, -66.0752085942), (5.2285560351, -73.2513125515))
            ThreePointArc((5.2285560351, -73.2513125515), (16.2546744281, -61.4434445271), (31.6772493906, -66.2543920036))
        make_face()
        Circle(F0_R_2, mode=Mode.SUBTRACT)
    extrude(amount=F1_DEPTH)


with BuildPart() as f2_1:
    # F2: copy of F1
    add(f1.part.moved(Location((0, 30.3657, 0))))


with BuildPart() as f2_1_1:
    # F3: moved
    add(f2_1.part.moved(Location((0, 15.24, 0))))


with BuildPart() as f1_1:
    add(f1.part)

    add(f2_1_1.part)  # F5 merges F2_1
    # F4 (on face) → F5 (join)
    with BuildSketch(Plane(origin=(0, 0, 0), x_dir=(-1, 0, 0), z_dir=(0, 1, 0))):
        Circle(F4_R)
        Circle(F4_R_2, mode=Mode.SUBTRACT)
    extrude(amount=F5_DEPTH)


with BuildPart() as f7:
    # F6 (on face) → F7 (new body)
    with BuildSketch(Plane(origin=(0, 45.6057, 0), x_dir=(-1, 0, 0), z_dir=(0, 1, 0))):
        with Locations((-12.232452631, 44.8086373508)):
            Circle(F6_R)
    extrude(amount=F7_DEPTH)


solid = Compound([f1_1.part, f7.part])
